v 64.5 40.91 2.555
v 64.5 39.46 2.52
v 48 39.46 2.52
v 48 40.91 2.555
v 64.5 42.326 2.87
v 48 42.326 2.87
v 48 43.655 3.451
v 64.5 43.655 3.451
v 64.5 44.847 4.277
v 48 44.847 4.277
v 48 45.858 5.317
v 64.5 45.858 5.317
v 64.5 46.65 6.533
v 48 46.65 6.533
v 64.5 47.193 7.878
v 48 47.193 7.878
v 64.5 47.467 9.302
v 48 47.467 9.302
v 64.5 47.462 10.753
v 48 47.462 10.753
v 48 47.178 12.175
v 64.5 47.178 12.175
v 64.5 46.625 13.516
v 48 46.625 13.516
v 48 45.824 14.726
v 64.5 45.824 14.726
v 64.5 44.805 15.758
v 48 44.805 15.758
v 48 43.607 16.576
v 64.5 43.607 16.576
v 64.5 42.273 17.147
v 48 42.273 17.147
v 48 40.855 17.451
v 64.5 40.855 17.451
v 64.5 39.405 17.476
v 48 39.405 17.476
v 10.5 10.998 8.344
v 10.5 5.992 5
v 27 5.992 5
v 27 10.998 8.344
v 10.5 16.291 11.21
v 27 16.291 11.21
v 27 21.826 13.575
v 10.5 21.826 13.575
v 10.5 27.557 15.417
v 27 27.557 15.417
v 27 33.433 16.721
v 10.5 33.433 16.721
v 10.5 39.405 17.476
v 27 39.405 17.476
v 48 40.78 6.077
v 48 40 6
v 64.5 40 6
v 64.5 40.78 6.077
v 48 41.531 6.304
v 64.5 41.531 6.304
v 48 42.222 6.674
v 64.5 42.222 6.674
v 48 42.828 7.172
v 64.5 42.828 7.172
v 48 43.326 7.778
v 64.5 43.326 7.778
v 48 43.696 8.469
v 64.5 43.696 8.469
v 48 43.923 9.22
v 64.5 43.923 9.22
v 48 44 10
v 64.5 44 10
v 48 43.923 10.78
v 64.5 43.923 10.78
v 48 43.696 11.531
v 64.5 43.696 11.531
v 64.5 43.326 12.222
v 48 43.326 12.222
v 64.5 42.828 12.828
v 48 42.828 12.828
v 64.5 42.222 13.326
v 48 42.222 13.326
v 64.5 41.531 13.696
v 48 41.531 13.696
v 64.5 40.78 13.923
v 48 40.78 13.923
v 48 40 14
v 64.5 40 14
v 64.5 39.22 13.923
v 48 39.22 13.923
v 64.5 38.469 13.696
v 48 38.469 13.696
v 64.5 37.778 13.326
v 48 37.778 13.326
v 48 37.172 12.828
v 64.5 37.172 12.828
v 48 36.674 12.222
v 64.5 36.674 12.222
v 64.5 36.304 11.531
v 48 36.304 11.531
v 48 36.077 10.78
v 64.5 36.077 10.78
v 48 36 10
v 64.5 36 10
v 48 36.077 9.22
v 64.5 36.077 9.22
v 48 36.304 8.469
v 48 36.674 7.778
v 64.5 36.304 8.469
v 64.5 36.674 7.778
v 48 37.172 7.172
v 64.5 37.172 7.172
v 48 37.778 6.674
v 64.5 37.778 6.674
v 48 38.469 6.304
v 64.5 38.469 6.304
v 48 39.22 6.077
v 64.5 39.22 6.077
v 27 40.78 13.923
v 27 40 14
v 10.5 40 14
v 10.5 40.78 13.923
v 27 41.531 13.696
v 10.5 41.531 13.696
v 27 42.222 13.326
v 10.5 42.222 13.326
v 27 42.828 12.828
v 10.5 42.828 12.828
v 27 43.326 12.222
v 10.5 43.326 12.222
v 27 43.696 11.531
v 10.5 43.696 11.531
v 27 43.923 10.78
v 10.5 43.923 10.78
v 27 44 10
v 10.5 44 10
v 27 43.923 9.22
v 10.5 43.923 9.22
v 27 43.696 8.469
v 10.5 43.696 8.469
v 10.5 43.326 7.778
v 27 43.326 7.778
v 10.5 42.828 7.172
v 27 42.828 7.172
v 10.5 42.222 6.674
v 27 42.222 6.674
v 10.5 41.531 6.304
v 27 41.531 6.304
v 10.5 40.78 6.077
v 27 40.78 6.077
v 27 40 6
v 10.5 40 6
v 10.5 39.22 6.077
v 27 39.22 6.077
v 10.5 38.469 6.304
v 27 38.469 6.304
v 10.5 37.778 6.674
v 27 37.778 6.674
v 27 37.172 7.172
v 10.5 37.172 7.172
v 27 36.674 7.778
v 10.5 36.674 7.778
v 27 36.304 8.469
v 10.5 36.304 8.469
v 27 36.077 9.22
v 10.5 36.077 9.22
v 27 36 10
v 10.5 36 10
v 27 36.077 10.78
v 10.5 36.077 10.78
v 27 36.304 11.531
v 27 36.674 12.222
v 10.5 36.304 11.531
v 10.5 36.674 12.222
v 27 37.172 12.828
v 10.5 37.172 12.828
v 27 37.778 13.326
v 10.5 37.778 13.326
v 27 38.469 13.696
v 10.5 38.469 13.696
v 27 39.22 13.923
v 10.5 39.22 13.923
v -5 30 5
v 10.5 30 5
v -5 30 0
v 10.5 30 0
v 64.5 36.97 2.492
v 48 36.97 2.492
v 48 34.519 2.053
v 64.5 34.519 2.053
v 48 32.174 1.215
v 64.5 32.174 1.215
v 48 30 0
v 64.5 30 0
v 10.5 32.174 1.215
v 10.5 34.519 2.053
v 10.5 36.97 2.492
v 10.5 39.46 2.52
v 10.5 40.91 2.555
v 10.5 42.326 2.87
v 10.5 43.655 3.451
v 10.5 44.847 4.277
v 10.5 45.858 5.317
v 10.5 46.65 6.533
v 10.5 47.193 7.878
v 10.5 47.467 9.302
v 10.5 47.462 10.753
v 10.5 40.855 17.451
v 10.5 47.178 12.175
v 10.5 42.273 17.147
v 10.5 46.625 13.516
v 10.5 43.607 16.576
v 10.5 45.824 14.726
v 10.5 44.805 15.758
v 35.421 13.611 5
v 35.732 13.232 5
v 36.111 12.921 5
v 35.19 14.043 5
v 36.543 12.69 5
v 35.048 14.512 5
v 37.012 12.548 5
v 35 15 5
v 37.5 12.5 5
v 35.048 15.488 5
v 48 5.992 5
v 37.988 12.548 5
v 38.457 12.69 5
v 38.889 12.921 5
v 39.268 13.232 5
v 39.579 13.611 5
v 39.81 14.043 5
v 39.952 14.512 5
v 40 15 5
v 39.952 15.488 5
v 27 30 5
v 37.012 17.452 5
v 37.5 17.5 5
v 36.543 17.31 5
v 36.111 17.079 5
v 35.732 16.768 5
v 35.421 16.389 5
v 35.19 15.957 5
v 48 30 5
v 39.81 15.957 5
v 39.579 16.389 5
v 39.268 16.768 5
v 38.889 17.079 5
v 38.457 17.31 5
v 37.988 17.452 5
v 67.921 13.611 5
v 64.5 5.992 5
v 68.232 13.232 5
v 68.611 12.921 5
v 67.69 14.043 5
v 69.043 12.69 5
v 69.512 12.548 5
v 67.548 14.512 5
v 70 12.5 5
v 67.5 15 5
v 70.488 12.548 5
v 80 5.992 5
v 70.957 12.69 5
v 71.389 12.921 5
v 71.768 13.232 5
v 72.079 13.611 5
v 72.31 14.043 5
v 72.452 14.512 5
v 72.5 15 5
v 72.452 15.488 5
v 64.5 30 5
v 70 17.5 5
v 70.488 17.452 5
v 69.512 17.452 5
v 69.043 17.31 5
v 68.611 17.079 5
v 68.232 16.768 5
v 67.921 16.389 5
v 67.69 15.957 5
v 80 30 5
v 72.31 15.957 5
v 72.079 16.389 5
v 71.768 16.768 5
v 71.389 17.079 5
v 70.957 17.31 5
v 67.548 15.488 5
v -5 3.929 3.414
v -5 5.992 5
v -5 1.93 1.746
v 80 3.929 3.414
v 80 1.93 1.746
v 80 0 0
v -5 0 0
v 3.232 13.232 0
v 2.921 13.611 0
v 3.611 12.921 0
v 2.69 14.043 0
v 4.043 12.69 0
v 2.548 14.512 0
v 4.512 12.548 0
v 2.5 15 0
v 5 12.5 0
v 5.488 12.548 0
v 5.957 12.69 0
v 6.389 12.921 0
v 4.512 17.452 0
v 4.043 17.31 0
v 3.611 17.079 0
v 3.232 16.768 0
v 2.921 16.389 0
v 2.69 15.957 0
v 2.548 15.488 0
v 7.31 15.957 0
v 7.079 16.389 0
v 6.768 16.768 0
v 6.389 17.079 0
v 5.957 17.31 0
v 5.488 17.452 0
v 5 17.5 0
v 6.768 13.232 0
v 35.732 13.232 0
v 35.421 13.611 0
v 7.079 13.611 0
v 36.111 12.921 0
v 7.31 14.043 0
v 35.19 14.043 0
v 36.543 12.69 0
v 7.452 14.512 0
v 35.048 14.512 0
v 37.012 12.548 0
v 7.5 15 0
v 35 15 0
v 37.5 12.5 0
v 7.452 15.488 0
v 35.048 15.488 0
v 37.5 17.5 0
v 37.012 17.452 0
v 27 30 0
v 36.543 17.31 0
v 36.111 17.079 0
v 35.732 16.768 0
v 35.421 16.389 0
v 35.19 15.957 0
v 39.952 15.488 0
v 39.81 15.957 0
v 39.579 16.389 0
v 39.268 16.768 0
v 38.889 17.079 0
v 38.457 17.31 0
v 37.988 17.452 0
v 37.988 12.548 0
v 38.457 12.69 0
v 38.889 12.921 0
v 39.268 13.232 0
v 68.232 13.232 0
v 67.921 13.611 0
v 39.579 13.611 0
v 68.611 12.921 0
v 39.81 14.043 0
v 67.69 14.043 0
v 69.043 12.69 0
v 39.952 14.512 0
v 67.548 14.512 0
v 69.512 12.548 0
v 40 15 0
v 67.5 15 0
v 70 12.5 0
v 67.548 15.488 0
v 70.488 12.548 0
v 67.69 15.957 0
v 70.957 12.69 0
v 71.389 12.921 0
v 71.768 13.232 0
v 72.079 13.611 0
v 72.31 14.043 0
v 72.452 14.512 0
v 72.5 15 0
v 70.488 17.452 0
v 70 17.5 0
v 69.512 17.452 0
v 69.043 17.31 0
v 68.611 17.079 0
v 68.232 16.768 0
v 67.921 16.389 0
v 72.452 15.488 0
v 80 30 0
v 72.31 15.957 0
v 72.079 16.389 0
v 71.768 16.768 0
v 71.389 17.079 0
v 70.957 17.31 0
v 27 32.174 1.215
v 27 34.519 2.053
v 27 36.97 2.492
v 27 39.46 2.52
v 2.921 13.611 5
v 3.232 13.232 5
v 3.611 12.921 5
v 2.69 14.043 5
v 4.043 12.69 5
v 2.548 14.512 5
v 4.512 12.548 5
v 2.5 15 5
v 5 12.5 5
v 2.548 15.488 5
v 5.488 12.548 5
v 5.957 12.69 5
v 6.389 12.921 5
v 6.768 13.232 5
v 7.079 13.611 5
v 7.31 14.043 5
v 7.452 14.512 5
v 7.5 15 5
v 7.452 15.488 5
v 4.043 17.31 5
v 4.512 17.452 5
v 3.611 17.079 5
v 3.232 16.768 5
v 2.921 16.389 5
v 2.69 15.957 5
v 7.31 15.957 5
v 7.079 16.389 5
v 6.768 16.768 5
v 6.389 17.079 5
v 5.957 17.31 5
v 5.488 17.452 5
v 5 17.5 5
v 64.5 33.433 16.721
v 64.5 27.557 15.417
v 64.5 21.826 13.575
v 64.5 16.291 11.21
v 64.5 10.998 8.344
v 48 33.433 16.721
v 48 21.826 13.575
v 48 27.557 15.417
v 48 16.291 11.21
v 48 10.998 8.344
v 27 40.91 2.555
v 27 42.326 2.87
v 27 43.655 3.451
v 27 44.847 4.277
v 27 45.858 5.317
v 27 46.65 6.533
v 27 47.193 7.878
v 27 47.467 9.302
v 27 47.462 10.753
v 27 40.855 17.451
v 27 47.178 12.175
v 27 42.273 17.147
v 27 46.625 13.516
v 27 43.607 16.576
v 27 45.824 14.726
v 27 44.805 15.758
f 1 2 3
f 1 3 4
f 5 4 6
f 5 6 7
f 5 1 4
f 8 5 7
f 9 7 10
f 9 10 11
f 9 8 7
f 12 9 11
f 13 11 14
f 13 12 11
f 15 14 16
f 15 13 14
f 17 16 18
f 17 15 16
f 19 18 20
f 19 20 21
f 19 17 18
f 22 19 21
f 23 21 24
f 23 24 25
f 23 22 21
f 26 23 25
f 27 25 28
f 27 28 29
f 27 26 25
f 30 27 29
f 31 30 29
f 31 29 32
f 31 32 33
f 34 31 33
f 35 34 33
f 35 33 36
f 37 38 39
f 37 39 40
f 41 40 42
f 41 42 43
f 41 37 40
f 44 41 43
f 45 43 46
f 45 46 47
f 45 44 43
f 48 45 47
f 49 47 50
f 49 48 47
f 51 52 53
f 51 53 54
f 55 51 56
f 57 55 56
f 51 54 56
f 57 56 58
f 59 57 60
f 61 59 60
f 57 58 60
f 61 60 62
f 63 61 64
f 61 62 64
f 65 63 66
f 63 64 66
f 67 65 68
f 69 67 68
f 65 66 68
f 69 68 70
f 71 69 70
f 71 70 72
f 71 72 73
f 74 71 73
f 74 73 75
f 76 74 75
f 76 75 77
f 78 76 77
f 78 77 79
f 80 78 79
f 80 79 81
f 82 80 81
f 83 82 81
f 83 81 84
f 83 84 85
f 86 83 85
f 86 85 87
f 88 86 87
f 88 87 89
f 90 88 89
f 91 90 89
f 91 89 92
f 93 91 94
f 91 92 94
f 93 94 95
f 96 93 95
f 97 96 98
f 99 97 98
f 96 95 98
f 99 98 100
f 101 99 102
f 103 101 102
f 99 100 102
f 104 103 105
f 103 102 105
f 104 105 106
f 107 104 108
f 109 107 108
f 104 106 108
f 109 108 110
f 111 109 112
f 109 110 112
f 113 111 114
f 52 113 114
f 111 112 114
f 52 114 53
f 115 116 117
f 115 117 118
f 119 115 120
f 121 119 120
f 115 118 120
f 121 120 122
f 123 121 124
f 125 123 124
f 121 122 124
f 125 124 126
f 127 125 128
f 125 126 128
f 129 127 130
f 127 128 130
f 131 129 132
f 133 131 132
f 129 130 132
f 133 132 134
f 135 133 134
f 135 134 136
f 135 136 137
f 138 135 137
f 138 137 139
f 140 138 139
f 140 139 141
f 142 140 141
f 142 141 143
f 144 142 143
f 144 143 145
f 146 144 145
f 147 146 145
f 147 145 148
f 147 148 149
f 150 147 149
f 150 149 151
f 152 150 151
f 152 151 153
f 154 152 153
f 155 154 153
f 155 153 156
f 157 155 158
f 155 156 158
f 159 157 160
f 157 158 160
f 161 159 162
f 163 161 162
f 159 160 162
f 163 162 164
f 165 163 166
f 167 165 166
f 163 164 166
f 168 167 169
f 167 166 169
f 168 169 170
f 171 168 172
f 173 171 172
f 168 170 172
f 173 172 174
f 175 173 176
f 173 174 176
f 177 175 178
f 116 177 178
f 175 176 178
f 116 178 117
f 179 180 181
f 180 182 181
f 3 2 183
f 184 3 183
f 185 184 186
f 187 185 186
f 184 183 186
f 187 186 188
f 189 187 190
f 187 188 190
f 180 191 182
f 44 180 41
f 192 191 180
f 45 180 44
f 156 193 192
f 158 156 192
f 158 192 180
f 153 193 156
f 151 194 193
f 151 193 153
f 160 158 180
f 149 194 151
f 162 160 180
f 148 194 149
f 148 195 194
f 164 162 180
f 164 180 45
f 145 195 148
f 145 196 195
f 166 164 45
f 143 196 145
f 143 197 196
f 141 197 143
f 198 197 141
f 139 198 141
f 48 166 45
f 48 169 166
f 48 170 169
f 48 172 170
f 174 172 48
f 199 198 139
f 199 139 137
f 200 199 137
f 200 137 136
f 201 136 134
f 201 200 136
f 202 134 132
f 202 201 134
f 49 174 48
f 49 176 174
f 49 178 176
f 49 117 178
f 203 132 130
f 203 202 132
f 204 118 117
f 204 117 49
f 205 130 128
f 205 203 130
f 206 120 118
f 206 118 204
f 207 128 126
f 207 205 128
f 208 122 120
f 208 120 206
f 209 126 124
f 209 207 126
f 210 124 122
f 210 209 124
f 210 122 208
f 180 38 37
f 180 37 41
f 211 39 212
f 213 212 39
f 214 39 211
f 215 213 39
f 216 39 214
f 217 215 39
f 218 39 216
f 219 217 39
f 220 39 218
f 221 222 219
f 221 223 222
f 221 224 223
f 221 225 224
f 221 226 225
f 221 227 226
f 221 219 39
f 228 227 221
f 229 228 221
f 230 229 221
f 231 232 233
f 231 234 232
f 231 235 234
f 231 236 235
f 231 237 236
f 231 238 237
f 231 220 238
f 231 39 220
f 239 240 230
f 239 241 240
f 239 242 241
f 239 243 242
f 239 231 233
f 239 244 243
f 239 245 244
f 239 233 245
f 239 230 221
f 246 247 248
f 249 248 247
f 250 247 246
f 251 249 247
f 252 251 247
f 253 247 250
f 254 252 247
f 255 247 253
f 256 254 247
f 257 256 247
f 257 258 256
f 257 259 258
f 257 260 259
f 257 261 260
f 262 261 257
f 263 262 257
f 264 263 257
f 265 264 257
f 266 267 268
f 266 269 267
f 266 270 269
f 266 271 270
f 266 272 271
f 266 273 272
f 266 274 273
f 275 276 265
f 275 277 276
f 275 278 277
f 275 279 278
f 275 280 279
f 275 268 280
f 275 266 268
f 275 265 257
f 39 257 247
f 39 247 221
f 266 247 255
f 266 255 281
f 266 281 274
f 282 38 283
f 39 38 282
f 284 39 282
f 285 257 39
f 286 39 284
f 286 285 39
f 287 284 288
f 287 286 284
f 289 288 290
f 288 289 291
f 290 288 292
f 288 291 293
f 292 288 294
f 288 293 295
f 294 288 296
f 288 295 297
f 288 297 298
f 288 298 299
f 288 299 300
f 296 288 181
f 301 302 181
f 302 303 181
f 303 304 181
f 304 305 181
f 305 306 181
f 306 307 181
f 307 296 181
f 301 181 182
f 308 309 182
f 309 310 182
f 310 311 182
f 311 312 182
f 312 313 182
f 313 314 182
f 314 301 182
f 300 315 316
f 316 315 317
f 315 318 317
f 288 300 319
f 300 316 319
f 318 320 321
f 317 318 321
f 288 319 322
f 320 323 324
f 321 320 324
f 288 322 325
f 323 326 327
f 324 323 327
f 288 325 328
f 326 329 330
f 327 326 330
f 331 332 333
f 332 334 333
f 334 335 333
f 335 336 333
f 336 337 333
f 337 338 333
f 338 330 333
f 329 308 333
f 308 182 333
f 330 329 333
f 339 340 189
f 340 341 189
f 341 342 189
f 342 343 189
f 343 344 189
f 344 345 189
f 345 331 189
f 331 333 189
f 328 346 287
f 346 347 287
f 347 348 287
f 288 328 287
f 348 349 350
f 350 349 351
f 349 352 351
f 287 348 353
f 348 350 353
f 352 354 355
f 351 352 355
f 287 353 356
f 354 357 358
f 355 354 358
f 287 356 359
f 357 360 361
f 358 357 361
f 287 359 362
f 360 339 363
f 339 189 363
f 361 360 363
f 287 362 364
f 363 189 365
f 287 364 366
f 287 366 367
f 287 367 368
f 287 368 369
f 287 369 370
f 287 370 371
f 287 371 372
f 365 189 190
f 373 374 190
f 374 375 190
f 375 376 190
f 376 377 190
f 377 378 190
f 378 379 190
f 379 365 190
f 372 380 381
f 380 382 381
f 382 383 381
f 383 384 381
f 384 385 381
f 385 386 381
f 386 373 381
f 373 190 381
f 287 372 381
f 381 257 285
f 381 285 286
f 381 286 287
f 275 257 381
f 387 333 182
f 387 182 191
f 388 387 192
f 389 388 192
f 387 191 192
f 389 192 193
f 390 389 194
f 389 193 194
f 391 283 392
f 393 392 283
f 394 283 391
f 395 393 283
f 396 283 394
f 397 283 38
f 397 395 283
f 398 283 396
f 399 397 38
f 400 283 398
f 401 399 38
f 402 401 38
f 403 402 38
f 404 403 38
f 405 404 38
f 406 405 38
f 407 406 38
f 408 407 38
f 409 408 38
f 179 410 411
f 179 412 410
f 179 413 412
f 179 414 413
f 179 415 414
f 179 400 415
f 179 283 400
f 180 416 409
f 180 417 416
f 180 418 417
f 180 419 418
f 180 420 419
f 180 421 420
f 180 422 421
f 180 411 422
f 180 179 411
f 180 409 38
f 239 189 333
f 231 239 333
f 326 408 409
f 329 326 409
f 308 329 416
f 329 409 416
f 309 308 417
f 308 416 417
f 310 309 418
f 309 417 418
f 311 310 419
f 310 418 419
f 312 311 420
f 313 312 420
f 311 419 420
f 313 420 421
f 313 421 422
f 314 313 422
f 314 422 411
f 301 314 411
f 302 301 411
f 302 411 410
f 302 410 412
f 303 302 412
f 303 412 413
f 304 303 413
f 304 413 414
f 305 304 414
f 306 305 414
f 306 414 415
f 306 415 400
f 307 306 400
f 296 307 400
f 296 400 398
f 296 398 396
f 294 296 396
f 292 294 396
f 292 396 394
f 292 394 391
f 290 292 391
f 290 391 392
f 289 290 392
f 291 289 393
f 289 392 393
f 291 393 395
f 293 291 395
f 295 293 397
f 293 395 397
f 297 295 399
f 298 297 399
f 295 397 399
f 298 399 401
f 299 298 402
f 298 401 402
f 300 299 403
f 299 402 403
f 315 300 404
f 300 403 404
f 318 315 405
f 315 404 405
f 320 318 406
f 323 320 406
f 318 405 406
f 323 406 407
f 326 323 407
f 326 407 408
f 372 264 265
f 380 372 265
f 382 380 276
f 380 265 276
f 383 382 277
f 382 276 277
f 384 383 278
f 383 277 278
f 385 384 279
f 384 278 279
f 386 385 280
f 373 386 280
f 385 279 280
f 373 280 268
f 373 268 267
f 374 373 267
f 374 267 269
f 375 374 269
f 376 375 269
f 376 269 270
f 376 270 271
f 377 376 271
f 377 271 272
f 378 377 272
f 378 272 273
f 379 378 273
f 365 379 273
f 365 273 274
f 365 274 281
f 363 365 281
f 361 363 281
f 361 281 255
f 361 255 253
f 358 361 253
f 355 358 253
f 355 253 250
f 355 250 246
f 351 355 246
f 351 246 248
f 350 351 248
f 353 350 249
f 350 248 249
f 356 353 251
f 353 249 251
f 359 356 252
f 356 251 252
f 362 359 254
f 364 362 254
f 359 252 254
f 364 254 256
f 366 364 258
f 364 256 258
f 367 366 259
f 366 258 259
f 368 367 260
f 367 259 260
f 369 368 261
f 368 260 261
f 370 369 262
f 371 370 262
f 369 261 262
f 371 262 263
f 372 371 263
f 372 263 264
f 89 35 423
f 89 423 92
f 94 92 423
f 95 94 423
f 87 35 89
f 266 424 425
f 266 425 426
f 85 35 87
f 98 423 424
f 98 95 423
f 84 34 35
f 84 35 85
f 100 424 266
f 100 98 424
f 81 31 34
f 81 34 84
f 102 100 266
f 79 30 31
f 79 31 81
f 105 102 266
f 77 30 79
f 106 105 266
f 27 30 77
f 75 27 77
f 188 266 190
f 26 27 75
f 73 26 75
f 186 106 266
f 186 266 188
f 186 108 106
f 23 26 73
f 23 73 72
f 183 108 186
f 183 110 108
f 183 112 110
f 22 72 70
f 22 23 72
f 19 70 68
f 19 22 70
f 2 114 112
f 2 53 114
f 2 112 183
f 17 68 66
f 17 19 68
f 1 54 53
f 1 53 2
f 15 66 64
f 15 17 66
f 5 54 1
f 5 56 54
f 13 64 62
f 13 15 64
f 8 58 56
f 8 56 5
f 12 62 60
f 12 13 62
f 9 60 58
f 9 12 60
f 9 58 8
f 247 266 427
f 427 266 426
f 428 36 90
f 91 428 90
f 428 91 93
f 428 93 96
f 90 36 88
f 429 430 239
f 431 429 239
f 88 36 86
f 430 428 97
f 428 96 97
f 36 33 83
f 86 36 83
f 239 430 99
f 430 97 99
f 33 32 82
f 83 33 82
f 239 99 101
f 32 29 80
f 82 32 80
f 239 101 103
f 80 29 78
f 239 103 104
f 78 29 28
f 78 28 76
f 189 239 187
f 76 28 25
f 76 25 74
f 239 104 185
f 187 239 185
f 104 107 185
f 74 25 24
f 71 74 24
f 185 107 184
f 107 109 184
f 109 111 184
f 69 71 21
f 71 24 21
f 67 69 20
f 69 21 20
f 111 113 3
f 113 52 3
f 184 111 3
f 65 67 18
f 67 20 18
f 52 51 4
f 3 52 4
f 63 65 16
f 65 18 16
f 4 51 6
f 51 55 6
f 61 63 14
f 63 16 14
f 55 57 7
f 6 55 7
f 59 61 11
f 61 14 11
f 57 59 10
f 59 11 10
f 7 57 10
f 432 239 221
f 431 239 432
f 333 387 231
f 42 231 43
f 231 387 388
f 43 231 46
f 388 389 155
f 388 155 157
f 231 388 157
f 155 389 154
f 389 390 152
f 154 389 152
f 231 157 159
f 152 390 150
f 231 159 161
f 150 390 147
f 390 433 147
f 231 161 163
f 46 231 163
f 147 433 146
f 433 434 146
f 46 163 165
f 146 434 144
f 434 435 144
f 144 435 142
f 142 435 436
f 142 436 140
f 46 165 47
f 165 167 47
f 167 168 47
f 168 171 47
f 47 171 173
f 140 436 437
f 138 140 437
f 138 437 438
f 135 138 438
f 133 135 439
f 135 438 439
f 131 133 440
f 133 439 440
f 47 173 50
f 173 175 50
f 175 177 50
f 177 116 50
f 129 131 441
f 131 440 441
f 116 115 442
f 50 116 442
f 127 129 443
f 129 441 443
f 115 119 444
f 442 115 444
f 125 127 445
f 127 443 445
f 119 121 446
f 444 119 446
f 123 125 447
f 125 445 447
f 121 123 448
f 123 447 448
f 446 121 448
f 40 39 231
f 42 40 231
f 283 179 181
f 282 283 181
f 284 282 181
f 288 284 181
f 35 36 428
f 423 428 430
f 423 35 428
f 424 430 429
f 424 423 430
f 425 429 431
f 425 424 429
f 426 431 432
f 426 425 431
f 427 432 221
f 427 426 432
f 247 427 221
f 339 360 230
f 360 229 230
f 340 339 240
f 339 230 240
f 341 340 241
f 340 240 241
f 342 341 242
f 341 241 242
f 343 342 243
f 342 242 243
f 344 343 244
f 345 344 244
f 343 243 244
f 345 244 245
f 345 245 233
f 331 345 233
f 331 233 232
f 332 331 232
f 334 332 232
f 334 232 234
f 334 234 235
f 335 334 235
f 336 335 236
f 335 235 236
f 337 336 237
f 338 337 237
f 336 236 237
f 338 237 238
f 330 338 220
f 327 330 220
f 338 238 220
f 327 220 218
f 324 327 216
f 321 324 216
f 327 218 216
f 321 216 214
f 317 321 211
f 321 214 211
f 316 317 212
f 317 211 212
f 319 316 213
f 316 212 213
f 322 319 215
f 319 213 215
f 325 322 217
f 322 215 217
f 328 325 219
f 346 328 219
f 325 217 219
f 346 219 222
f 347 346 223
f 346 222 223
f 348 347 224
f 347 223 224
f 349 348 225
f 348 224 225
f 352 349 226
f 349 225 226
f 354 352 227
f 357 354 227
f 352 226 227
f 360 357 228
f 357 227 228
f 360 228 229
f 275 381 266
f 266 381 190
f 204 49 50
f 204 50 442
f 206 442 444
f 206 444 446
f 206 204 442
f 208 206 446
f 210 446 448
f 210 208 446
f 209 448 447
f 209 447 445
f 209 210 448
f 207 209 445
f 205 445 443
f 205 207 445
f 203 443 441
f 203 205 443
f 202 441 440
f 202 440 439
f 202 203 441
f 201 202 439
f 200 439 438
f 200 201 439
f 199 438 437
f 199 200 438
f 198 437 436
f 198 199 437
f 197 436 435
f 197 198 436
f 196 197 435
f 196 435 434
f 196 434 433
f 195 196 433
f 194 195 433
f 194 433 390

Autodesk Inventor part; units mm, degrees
ref_plane "YZ Plane" through (0, 0, 0) normal (1, 0, 0) x (0, 1, 0)
sketch "Sketch1" plane through (0, 0, 0) normal (0, 0, 1) x (1, 0, 0)
  line L0 (0, 0) -> (75, 0)
  line L1 (75, 0) -> (75, 30)
  line L2 (75, 30) -> (0, 30)
  line L3 (0, 30) -> (0, 0)
  point P0 (75, 15)
  point P1 (37.5, 30)
  dimension "d0" = 75
  dimension "d1" = 30
extrude "Extrusion1" add sketch "Sketch1" along normal blind 5
ref_plane "Work Plane1" through (64.5, 0, 0) normal (1, 0, 0) x (0, 0, -1)
sketch "Sketch2" plane through (64.5, 0, 0) normal (1, 0, 0) x (0, 0, -1)
  circle A0 centre (-10, 40) radius 4
  circle A1 centre (-10, 40) radius 7.5 construction
  arc A2 (-17.4763, 39.4047) -> (0, 0) centre (47.3186, 44.564) ccw
  arc A3 (-2.5195, 39.4597) -> (-17.4763, 39.4047) centre (-10, 40) ccw
  arc A4 (-2.5195, 39.4597) -> (0, 30) centre (12.4415, 38.379) ccw
  line L0 (0, 30) -> (-5, 30) projected
  line L1 (0, 0) -> (0, 30) construction
  line L2 (0, 30) -> (0, 0)
  dimension "d8" = 8
  dimension "d9" = 15
  dimension "d13" = 65
  dimension "d26" = 15
  dimension "d27" = 10
  dimension "d28" = 10
extrude "Extrusion2" add sketch "Sketch2" against normal blind 16.5
ref_plane "Work Plane2" through (10.5, 0, 0) normal (-1, 0, 0) x (0, 0, 1)
sketch "Sketch3" plane through (10.5, 0, 0) normal (-1, 0, 0) x (0, 0, 1)
  circle A0 centre (10, 40) radius 4 projected
  line L0 (5, 5.9924) -> (5, 30) projected
  arc A1 (5, 5.9924) -> (17.4763, 39.4047) centre (-47.3186, 44.564) ccw projected
  arc A2 (17.4763, 39.4047) -> (2.5195, 39.4597) centre (10, 40) ccw projected
  line L1 (5, 30) -> (0, 30) projected
  arc A3 (0, 30) -> (2.5195, 39.4597) centre (-12.4415, 38.379) ccw projected
  point P0 (0, 0)
extrude "Extrusion3" add sketch "Sketch3" against normal blind 16.5
sketch "Sketch7" plane through (0, 0, 5) normal (0, 0, 1) x (1, 0, 0)
  line L0 (5, 15) -> (70, 15) construction
  line L1 (0, 0) -> (75, 0) projected
  circle A0 centre (5, 15) radius 2.5
  circle A1 centre (37.5, 15) radius 2.5
  circle A2 centre (70, 15) radius 2.5
  line L2 (0, 30) -> (0, 0) projected
  point P0 (37.5, 0)
  point P1 (0, 15)
  dimension "d29" = 65
  dimension "d30" = 5
  dimension "d31" = 5
  dimension "d32" = 5
extrude "Extrusion6" cut sketch "Sketch7" against normal through all
sketch "Sketch9" plane through (0, 0, 5) normal (0, 0, 1) x (1, 0, 0)
  line L0 (10.5, 30) -> (0, 30) projected
  line L1 (0, 30) -> (-5, 30)
  line L2 (-5, 30) -> (-5, 0)
  line L3 (-5, 0) -> (0, 0)
  line L4 (0, 0) -> (0, 30)
  line L5 (0, 0) -> (75, 0) projected
  line L6 (75, 0) -> (80, 0)
  line L7 (80, 0) -> (80, 30)
  line L8 (80, 30) -> (75, 30)
  line L9 (75, 30) -> (75, 0)
  point P0 (-2.5, 0)
  dimension "d37" = 5
  dimension "d38" = 5
extrude "Extrusion8" add sketch "Sketch9" against normal blind 5
sketch "Sketch8" plane through (10.5, 0, 0) normal (-1, 0, 0) x (0, 0, 1)
  arc A0 (5, 5.9924) -> (17.4763, 39.4047) centre (-47.3186, 44.564) ccw construction
  arc A1 (0, 0) -> (17.4763, 39.4047) centre (-47.3186, 44.564) ccw construction
  line L0 (5, 0) -> (5, 30) projected
  line L1 (5, 5.9924) -> (5, 0)
  line L2 (5, 0) -> (0, 0)
  arc A2 (0, 0) -> (5, 5.9924) centre (-47.3186, 44.564) ccw
extrude "Extrusion7" cut sketch "Sketch8" along normal through all both and the other way through all
properties part number "TC007b" material "ABS Plastic"
